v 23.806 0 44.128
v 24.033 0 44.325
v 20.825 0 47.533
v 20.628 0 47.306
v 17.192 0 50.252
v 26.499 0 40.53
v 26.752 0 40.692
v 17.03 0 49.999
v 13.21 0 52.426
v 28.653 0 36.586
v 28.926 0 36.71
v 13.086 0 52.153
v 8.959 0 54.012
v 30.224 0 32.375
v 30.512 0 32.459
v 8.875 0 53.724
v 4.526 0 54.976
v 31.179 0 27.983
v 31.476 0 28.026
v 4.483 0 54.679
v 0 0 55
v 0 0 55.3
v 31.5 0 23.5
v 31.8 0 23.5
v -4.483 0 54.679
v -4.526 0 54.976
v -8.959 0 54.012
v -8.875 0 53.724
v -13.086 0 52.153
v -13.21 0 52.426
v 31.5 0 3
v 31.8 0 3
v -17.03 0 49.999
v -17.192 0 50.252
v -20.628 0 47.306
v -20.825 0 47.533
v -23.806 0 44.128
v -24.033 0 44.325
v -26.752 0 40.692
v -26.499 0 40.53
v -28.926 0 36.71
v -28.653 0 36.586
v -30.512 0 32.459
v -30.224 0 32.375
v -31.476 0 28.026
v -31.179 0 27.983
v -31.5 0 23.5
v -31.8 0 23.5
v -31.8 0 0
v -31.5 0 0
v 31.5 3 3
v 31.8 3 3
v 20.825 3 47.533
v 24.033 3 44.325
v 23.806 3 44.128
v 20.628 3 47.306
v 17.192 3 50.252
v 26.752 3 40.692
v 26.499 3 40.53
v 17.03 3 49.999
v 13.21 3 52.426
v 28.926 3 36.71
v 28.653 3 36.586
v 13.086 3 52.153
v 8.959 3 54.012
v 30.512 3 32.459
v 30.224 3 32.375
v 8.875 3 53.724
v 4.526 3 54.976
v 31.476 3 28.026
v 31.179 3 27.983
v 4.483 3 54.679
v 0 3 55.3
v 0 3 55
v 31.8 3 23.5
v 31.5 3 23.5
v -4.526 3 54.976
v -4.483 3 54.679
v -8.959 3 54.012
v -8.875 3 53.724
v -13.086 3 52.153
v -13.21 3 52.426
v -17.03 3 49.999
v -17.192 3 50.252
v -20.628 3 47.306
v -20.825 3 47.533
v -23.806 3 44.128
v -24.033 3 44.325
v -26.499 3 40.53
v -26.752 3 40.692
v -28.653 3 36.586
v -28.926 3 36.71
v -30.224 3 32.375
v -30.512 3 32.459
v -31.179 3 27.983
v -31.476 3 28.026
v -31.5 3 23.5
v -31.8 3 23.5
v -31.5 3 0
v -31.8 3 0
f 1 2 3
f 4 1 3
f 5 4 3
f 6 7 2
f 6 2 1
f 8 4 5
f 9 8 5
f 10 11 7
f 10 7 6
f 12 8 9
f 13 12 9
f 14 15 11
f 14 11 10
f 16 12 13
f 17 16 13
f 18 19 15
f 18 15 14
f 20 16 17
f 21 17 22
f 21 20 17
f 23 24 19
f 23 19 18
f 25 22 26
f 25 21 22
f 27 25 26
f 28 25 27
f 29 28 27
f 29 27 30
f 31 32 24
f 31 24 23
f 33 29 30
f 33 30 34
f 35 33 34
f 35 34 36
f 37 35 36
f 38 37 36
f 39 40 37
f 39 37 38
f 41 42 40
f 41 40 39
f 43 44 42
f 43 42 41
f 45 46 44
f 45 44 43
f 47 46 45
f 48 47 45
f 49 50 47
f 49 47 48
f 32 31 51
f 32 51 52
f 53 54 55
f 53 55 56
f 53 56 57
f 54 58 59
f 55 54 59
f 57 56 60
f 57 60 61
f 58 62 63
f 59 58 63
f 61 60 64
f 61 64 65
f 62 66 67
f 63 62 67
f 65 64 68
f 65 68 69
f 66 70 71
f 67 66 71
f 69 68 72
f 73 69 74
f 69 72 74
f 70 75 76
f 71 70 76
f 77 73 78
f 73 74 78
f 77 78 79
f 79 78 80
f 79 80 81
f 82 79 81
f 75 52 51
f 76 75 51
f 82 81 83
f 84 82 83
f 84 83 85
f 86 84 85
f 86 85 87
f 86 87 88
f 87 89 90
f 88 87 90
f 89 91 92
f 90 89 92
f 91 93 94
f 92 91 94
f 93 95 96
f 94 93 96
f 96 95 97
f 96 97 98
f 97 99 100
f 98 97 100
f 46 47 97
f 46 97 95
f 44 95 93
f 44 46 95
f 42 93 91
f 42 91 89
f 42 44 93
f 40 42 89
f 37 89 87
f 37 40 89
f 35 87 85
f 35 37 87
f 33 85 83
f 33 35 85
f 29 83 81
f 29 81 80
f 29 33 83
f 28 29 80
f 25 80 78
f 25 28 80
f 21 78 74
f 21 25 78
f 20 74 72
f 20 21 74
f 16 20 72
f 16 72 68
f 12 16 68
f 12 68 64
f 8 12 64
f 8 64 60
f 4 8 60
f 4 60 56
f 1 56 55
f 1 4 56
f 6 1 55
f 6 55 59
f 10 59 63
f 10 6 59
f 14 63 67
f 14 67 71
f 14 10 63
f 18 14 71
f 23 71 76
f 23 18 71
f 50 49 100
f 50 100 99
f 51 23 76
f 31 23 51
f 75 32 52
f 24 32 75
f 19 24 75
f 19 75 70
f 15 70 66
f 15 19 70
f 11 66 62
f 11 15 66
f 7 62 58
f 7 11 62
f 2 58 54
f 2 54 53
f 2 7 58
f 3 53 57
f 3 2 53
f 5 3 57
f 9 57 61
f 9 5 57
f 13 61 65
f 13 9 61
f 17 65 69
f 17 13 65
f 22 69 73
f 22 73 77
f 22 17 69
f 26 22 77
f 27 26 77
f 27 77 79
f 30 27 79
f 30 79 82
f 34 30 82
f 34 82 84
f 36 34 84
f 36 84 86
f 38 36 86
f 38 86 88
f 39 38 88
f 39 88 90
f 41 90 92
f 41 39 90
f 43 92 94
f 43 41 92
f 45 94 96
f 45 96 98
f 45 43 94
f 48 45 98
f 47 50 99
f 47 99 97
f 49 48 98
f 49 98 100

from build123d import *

# Parameters (mm, degrees)
BOSS_EXTRUDE1_DEPTH = 3


with BuildPart() as part:
    # Sketch1 → Boss-Extrude1 (new body)
    with BuildSketch(Plane(origin=(0, 0, 0), x_dir=(1, 0, 0), z_dir=(0, 1, 0))):
        with BuildLine():
            Line((-31.5, 0), (-31.5, -23.5))
            ThreePointArc((-31.5, -23.5), (0, -55), (31.5, -23.5))
            Line((31.5, -23.5), (31.5, -3))
            Line((31.5, -3), (31.8, -3))
            Line((31.8, -3), (31.8, -23.5))
            ThreePointArc((31.8, -23.5), (0, -55.3), (-31.8, -23.5))
            Line((-31.8, -23.5), (-31.8, 0))
            Line((-31.8, 0), (-31.5, 0))
        make_face()
    extrude(amount=BOSS_EXTRUDE1_DEPTH)


solid = part.part
